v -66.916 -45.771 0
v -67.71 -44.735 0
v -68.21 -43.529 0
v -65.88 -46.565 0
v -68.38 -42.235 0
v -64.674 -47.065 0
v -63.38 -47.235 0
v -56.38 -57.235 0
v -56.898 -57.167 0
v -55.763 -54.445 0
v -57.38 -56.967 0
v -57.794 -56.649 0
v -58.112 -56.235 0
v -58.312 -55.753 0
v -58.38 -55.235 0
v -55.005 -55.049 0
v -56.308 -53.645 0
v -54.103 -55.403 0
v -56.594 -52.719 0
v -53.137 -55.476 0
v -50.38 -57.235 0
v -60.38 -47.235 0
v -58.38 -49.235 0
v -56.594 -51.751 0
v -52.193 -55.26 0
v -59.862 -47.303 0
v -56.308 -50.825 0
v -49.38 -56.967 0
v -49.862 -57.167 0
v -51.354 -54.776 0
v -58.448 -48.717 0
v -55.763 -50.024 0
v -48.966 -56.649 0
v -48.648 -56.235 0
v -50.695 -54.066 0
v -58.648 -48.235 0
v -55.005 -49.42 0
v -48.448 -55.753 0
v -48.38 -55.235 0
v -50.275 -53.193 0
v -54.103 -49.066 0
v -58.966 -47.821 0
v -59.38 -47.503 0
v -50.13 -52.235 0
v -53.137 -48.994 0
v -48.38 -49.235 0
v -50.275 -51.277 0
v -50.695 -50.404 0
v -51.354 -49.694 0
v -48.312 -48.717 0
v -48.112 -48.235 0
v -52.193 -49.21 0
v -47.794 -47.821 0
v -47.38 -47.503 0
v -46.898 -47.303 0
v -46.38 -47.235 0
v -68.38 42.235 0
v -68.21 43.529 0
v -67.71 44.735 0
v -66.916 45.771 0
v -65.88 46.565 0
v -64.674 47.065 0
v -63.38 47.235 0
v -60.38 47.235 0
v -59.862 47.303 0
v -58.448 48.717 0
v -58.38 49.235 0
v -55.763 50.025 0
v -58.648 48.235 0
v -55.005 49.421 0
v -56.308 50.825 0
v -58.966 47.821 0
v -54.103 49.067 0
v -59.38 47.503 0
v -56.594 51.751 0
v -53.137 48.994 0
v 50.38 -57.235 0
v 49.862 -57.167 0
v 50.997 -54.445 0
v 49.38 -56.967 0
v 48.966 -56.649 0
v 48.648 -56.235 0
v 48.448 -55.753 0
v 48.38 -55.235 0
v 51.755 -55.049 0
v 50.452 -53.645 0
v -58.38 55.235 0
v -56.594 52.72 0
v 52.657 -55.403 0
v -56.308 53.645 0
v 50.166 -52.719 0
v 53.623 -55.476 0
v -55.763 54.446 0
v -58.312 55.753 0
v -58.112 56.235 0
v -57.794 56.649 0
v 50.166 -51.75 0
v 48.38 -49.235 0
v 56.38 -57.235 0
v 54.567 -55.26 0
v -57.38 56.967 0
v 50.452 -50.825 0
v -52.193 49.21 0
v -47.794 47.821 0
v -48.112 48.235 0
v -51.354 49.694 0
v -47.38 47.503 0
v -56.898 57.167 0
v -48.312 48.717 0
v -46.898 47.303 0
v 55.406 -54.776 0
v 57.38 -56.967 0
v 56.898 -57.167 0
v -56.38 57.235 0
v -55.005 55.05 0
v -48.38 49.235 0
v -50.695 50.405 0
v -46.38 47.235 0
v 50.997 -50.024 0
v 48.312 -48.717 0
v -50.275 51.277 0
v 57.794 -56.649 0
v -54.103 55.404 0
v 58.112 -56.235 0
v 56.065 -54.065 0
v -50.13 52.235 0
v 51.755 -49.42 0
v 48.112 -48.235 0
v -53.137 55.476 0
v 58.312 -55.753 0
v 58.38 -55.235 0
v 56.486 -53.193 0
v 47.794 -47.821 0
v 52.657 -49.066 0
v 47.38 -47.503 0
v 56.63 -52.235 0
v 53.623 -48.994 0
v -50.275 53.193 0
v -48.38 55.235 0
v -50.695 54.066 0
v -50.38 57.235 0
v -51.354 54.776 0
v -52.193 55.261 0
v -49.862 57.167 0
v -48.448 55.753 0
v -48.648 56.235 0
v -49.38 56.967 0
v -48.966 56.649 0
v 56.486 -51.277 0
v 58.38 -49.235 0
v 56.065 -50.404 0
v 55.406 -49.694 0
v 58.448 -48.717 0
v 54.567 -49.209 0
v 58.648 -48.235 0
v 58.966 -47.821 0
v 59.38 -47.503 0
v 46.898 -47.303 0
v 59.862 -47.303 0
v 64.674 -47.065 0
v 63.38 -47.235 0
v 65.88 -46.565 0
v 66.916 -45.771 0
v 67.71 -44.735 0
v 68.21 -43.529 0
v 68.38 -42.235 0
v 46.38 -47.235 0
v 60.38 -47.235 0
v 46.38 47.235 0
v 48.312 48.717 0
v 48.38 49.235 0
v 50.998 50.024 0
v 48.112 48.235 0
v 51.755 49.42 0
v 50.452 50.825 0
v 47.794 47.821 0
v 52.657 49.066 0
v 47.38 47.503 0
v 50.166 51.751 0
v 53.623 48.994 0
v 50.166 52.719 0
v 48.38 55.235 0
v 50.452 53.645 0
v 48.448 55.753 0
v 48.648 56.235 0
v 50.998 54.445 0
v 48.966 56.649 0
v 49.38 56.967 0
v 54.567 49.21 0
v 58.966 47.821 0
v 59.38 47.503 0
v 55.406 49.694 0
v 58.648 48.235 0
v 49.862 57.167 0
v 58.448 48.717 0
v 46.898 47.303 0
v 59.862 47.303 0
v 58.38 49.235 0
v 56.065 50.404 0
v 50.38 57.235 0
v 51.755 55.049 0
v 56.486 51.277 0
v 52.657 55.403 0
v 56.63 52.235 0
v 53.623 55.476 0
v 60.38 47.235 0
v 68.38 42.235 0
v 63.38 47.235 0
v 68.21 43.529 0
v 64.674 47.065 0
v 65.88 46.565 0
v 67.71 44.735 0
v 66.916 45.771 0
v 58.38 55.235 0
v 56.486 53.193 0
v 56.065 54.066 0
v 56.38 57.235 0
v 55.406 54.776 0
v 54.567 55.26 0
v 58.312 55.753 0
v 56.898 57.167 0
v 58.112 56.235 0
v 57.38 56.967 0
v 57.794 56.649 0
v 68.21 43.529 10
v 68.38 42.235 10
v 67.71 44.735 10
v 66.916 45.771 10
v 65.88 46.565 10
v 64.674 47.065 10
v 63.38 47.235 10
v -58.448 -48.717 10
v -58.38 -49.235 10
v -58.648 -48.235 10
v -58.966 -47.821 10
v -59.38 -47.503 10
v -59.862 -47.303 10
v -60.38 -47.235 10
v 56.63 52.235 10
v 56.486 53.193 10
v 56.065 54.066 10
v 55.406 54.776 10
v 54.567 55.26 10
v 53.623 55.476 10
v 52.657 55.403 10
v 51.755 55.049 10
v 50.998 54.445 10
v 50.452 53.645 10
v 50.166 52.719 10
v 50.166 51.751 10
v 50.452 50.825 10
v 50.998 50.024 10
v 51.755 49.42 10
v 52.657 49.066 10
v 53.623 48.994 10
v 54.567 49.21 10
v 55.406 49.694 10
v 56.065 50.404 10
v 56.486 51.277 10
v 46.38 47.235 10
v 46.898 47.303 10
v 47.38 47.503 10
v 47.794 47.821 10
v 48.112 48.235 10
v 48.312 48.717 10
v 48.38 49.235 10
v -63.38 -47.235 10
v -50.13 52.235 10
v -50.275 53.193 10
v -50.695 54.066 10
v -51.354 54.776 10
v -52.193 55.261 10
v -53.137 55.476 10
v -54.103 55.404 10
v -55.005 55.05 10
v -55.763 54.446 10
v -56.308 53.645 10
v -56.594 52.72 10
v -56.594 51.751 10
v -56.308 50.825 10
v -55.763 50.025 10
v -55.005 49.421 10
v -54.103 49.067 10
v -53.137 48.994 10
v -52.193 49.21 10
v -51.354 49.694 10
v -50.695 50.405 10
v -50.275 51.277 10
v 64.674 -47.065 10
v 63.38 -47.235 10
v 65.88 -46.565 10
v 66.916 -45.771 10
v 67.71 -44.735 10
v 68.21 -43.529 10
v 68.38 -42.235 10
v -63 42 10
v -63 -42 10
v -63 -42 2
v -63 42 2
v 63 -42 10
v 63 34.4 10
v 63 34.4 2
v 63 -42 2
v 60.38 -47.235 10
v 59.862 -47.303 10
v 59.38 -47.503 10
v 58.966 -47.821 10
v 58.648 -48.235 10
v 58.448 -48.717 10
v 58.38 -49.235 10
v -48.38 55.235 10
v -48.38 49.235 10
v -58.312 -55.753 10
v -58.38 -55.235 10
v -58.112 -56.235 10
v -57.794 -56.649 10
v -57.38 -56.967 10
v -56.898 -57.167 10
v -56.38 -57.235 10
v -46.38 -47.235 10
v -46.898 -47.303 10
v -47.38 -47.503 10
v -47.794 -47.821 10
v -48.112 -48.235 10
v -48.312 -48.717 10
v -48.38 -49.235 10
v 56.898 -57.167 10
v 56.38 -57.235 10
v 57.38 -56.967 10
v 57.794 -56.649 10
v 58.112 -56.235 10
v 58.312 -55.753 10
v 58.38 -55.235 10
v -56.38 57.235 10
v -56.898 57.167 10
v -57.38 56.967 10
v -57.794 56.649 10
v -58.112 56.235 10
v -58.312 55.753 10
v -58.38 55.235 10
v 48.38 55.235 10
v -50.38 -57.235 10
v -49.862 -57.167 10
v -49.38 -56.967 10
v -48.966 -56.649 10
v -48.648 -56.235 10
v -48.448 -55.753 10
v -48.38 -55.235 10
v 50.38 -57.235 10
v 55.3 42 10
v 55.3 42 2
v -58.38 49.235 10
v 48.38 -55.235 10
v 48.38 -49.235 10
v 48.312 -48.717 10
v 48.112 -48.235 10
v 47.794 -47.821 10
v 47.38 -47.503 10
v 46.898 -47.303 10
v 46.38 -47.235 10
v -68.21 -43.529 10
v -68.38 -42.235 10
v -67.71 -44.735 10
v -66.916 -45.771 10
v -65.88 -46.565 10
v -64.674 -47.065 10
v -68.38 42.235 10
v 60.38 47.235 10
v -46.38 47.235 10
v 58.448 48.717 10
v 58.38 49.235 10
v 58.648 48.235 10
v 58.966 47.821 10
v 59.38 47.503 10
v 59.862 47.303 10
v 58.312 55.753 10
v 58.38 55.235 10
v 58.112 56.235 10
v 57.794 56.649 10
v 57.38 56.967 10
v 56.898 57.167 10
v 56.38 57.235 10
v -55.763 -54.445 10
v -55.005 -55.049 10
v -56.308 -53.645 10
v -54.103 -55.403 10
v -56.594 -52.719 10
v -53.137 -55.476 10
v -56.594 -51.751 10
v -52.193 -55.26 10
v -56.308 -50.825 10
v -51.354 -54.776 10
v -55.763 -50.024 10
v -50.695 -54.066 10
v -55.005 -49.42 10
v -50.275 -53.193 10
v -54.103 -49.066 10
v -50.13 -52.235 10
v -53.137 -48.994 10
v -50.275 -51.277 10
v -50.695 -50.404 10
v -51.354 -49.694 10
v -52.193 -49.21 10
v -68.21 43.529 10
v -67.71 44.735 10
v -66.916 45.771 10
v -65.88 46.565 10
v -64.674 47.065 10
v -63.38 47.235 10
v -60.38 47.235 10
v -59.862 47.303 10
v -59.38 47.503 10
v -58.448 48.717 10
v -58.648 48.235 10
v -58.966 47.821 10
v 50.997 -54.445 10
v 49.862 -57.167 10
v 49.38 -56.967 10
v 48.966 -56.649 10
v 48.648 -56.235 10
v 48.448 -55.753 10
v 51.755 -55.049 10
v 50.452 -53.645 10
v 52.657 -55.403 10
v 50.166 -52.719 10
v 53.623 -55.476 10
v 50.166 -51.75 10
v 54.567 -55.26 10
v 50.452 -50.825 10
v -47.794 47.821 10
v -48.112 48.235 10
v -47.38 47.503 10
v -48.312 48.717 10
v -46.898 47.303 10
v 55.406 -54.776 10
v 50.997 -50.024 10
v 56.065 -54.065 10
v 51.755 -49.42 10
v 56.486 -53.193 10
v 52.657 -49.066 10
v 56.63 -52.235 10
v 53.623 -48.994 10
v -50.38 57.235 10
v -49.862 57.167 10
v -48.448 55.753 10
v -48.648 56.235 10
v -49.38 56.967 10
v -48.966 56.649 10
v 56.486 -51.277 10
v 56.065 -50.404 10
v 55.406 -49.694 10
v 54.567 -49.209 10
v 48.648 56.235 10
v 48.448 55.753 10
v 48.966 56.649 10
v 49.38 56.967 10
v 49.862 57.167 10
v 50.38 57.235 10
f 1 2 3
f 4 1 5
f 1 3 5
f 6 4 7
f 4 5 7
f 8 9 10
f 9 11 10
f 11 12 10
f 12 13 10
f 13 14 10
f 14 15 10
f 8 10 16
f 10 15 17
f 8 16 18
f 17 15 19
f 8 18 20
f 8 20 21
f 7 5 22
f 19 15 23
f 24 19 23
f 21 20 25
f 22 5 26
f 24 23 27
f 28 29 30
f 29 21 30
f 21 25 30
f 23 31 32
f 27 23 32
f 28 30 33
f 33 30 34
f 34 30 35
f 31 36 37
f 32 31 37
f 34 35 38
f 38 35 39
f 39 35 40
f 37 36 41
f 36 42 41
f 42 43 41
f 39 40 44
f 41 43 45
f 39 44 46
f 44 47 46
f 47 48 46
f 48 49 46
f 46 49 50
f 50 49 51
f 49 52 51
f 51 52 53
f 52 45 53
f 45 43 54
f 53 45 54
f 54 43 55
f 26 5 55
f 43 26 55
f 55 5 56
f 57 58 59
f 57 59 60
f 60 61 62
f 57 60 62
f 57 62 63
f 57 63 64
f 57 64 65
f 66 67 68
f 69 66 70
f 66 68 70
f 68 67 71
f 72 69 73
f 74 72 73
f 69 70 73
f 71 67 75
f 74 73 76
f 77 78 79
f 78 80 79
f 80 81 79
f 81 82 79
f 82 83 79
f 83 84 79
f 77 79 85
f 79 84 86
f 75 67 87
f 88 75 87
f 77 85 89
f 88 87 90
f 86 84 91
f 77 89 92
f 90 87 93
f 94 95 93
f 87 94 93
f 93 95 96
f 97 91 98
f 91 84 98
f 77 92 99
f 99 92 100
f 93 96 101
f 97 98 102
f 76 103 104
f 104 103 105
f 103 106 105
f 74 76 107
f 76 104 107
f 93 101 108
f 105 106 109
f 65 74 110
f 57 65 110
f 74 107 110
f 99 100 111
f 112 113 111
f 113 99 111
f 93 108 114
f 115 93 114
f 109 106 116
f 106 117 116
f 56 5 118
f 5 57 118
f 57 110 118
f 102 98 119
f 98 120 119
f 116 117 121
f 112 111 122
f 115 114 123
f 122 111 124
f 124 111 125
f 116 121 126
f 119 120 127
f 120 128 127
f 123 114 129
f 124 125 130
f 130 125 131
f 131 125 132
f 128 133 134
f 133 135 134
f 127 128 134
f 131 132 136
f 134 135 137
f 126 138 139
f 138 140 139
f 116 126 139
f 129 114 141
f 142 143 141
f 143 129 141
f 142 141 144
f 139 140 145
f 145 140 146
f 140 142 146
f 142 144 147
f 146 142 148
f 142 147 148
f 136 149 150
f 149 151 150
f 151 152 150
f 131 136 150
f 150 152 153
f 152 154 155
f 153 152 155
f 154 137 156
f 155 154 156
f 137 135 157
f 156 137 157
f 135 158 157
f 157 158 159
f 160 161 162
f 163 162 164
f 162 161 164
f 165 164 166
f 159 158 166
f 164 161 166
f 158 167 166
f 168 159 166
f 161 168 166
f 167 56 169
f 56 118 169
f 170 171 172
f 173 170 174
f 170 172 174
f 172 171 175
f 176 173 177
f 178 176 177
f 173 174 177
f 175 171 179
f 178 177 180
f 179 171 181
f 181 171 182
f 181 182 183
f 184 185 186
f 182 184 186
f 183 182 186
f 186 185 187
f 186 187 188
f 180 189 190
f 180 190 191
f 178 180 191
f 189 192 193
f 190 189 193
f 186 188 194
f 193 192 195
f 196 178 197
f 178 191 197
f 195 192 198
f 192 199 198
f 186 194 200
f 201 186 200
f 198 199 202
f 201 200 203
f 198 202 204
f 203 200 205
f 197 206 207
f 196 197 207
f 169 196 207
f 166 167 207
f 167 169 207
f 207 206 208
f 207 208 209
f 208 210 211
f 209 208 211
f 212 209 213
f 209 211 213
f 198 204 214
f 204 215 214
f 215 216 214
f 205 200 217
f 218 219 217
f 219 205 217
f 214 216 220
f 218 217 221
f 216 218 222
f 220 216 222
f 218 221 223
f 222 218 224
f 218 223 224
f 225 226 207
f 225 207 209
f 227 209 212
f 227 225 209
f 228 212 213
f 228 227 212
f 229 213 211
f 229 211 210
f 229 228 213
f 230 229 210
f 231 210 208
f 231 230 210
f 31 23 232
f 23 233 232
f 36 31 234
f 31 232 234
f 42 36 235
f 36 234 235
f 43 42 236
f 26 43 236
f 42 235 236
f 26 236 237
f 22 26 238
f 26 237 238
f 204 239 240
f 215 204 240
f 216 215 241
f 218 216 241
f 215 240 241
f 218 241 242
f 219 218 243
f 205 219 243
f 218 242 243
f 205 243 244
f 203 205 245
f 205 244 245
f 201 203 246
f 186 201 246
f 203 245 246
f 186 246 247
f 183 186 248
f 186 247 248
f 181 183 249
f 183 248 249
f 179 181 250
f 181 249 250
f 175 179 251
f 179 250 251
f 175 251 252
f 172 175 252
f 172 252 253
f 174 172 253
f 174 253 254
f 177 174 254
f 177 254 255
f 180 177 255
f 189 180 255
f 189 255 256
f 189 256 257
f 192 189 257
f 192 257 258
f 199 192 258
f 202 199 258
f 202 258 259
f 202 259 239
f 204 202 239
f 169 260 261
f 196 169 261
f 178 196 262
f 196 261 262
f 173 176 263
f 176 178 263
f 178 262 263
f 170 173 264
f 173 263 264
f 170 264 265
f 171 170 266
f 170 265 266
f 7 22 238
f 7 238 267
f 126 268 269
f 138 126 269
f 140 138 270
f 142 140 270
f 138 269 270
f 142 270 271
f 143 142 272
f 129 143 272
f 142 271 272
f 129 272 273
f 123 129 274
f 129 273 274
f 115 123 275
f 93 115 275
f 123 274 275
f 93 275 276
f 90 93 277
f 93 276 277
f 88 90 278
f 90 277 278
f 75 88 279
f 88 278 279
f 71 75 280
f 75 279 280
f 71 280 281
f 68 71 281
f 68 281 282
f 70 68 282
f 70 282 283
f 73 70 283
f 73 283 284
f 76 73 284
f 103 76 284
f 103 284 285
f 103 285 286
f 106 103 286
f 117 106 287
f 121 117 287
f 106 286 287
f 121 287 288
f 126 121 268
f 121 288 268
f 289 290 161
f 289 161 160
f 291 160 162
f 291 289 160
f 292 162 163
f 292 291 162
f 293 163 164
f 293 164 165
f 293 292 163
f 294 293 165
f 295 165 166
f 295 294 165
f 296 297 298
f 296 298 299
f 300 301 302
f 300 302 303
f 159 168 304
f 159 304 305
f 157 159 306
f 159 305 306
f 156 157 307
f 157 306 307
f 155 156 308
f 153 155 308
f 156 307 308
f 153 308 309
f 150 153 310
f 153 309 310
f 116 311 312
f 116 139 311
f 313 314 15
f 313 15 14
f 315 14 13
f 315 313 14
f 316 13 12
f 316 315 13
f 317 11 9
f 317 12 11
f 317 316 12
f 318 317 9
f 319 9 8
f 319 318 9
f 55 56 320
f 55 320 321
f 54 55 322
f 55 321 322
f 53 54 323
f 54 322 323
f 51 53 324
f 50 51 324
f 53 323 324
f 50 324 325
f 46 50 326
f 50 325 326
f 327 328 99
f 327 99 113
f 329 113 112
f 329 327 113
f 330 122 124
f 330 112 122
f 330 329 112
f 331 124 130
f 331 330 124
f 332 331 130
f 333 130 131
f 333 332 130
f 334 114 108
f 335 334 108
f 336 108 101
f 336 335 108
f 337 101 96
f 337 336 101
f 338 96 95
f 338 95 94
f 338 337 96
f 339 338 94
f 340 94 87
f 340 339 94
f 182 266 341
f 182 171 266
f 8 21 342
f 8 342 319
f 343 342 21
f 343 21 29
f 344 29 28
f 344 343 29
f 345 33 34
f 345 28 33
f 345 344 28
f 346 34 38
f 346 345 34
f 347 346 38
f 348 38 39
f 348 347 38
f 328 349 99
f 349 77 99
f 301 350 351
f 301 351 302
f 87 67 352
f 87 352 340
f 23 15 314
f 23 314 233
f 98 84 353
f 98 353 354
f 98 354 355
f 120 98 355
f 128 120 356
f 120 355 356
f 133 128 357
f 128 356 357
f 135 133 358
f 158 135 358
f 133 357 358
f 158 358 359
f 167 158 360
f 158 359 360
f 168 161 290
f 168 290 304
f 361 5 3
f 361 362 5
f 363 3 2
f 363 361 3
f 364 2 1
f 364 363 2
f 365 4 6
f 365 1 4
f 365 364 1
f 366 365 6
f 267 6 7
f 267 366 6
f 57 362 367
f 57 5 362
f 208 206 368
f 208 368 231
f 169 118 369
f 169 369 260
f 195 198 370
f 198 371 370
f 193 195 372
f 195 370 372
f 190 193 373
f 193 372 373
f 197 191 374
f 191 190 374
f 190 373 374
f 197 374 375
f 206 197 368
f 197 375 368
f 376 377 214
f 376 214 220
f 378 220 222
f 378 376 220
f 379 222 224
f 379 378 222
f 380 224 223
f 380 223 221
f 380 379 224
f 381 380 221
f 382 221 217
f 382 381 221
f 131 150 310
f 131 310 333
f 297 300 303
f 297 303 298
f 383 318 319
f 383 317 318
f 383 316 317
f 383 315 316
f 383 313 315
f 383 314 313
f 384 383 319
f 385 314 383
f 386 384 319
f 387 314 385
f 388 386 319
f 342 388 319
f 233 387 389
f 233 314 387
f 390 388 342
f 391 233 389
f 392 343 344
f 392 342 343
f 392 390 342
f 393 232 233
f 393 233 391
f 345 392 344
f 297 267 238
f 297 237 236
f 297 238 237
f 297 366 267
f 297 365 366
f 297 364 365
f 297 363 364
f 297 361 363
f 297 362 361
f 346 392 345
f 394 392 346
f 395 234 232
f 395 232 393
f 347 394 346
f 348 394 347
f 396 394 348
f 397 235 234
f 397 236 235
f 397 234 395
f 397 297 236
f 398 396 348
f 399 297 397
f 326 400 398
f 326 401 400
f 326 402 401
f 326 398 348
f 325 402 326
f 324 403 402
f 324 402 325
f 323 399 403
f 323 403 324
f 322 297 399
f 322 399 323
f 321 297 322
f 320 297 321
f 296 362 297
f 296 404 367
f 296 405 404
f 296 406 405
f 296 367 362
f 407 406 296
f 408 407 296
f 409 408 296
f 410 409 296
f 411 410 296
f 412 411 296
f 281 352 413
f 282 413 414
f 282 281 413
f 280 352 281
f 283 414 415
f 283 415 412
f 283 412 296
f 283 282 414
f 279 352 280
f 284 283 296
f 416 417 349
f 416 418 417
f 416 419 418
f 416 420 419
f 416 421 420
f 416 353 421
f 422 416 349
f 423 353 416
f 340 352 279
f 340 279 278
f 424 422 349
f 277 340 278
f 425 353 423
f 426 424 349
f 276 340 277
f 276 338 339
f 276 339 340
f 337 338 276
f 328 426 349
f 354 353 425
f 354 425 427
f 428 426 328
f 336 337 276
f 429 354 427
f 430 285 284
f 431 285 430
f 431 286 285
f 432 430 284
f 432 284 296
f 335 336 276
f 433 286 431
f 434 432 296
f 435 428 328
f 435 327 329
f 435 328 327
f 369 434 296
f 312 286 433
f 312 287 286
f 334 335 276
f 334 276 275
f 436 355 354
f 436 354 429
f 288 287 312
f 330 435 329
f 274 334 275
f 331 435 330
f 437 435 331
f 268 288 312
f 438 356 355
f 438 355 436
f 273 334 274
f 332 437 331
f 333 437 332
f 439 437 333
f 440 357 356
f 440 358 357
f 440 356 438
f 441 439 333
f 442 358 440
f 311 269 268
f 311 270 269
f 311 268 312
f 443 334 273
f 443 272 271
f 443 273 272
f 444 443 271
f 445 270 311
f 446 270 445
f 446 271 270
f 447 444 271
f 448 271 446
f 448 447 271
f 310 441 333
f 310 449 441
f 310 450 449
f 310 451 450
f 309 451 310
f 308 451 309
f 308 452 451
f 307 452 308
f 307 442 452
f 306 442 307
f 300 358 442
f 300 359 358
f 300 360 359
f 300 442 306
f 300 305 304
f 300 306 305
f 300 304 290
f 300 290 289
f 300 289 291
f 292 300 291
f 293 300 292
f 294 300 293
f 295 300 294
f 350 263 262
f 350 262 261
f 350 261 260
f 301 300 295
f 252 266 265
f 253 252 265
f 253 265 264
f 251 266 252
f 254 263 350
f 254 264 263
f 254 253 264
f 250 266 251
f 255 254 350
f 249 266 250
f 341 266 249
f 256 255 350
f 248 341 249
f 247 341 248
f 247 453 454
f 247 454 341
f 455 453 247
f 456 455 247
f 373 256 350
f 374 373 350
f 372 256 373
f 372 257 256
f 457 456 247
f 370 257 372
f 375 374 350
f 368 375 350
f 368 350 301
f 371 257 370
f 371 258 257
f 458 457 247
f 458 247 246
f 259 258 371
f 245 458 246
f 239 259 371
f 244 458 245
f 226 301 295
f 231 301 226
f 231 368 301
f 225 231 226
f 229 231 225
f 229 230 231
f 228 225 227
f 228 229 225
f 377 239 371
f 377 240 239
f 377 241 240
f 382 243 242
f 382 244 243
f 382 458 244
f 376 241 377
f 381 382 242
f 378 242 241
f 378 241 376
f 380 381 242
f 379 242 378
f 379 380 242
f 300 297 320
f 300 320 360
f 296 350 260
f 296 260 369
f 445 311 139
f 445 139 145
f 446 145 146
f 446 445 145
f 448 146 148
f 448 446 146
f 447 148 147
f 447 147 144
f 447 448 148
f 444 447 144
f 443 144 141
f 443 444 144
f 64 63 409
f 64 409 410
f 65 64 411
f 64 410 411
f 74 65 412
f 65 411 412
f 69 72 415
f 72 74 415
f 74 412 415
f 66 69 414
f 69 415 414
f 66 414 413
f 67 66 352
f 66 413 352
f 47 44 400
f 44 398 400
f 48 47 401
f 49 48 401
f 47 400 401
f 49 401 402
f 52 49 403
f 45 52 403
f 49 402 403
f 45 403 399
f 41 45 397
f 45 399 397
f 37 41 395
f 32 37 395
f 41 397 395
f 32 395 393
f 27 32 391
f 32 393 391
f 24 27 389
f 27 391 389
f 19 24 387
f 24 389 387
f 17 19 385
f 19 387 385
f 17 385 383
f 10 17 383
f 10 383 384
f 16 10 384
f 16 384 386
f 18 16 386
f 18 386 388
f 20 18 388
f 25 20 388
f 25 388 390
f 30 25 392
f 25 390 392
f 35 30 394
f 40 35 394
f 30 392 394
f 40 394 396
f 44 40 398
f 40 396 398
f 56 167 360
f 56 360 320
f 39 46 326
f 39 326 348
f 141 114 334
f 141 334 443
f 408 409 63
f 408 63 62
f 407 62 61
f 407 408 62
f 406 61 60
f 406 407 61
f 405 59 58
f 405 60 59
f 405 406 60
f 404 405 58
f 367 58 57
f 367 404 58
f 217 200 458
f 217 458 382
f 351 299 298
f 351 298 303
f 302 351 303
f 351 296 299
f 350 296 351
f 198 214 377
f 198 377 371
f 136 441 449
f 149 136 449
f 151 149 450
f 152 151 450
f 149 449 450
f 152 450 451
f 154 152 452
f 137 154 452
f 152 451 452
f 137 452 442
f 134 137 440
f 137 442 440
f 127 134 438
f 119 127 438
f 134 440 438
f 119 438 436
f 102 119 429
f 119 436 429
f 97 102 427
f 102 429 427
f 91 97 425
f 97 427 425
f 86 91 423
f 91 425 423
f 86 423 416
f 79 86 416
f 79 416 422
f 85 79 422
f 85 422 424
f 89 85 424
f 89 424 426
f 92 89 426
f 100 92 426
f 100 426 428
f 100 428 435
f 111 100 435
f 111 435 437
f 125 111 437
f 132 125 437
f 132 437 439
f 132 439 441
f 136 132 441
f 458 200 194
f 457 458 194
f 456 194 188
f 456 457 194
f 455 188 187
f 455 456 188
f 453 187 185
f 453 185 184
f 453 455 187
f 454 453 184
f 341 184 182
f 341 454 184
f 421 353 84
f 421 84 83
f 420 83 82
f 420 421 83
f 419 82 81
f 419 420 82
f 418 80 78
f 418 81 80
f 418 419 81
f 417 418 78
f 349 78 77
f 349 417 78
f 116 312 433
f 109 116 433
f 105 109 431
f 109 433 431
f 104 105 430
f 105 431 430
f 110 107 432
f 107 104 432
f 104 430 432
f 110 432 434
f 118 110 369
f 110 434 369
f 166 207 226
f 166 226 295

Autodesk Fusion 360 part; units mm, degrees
sketch "Sketch1" plane through (0, 0, 0) normal (0, 0, 1) x (1, 0, 0)
  line L0 (68.38, -47.235) -> (-68.38, -47.235)
  line L1 (-68.38, -47.235) -> (-68.38, 47.235)
  line L2 (-68.38, 47.235) -> (68.38, 47.235)
  line L3 (68.38, 47.235) -> (68.38, -47.235)
  line L4 (68.38, -47.235) -> (-68.38, 47.235) construction
  line L5 (-68.38, -47.235) -> (68.38, 47.235) construction
  line L6 (-48.38, 47.235) -> (-58.38, 47.235)
  line L7 (-58.38, 47.235) -> (-58.38, 57.235)
  line L8 (-58.38, 57.235) -> (-48.38, 57.235)
  line L9 (-48.38, 57.235) -> (-48.38, 47.235)
  line L10 (-48.38, 47.235) -> (-58.38, 57.235) construction
  line L11 (-58.38, 47.235) -> (-48.38, 57.235) construction
  line L12 (48.38, 57.235) -> (58.38, 57.235)
  line L13 (48.38, 47.235) -> (48.38, 57.235)
  line L14 (58.38, 57.235) -> (58.38, 47.235)
  line L15 (58.38, 47.235) -> (48.38, 47.235)
  line L16 (48.38, -57.235) -> (48.38, -47.235)
  line L17 (48.38, -47.235) -> (58.38, -47.235)
  line L18 (58.38, -47.235) -> (58.38, -57.235)
  line L19 (48.38, -57.235) -> (58.38, -57.235)
  line L20 (-58.38, -57.235) -> (-58.38, -47.235)
  line L21 (-58.38, -47.235) -> (-48.38, -47.235)
  line L22 (-48.38, -47.235) -> (-48.38, -57.235)
  line L23 (-48.38, -57.235) -> (-58.38, -57.235)
  point P0 (-53.38, 52.235)
  dimension "d1" = 136.76
  dimension "d2" = 94.47
  dimension "d3" = 10
  dimension "d4" = 10
  dimension "d6" = 10
  dimension "d7" = 10
extrude "Extrude1" add sketch "Sketch1" along normal blind 10 and the other way blind 0
ref_plane "WorkPlane1" through (0, 0, 10) normal (0, 0, 1) x (1, 0, 0)
sketch "Sketch2" plane through (0, 0, 10) normal (0, 0, 1) x (1, 0, 0)
  line L0 (62.5, -41.5) -> (-62.5, -41.5)
  line L1 (-62.5, -41.5) -> (-62.5, 41.5)
  line L2 (-62.5, 41.5) -> (62.5, 41.5)
  line L3 (62.5, 41.5) -> (62.5, -41.5)
  line L4 (62.5, -41.5) -> (-62.5, 41.5) construction
  line L5 (-62.5, -41.5) -> (62.5, 41.5) construction
  line L6 (-62.5, -41.5) -> (-62.5, 34.9)
  line L7 (62.5, 41.5) -> (-55.8, 41.5)
  line L8 (-62.5, 34.9) -> (-55.8, 41.5)
  dimension "d13" = 125
  dimension "d14" = 83
  dimension "d15" = 76.4
  dimension "d16" = 118.3
extrude "Extrude2" cut sketch "Sketch2" against normal blind 8 contours L0 L1 L2 L3 L6 L7 L8
ref_plane "WorkPlane2" through (0, 0, 10) normal (0, 0, 1) x (1, 0, 0)
sketch "Sketch3" plane through (0, 0, 10) normal (0, 0, 1) x (1, 0, 0)
  circle A0 centre (-53.3802, 52.2353) radius 3.25
  circle A1 centre (53.38, 52.2349) radius 3.25
  circle A2 centre (53.3799, -52.2347) radius 3.25
  circle A3 centre (-53.3802, -52.2349) radius 3.25
  dimension "d20" = 6.5
  dimension "d21" = 6.5
  dimension "d22" = 6.5
  dimension "d23" = 6.5
extrude "Extrude3" cut sketch "Sketch3" against normal blind 10
fillet "Fillet1" radius 5 4 edges at (68.38, -47.235, 5) (68.38, 47.235, 5) (-68.38, -47.235, 5) (-68.38, 47.235, 5)
fillet "Fillet2" radius 2 16 edges at (58.38, -47.235, 5) (58.38, -57.235, 5) (48.38, -57.235, 5) (58.38, 57.235, 5) (-48.38, -47.235, 5) (-48.38, -57.235, 5) (-58.38, -57.235, 5) (-48.38, 57.235, 5) (58.38, 47.235, 5) (-48.38, 47.235, 5) (-58.38, 57.235, 5) (48.38, 57.235, 5) (48.38, 47.235, 5) (-58.38, 47.235, 5) (48.38, -47.235, 5) (-58.38, -47.235, 5)
extrude "Extrude4" add 1 faces at (-18.6, -13.8333, 2) along direction (0, 0, 1) blind 8
ref_plane "WorkPlane3" through (0, 0, 10) normal (0, 0, 1) x (1, 0, 0)
sketch "Sketch4" plane through (0, 0, 10) normal (0, 0, 1) x (1, 0, 0)
  line L0 (63, -42) -> (-63, -42)
  line L1 (-63, -42) -> (-63, 42)
  line L2 (-63, 42) -> (63, 42)
  line L3 (63, 42) -> (63, -42)
  line L4 (63, -42) -> (-63, 42) construction
  line L5 (-63, -42) -> (63, 42) construction
  line L6 (63, -42) -> (63, 34.4)
  line L7 (-63, 42) -> (55.3, 42)
  line L8 (55.3, 42) -> (63, 34.4)
  dimension "d31" = 126
  dimension "d32" = 84
  dimension "d33" = 76.4
  dimension "d34" = 118.3
extrude "Extrude6" cut sketch "Sketch4" against normal blind 8 contours L0 L1 L2 L3 L6 L7 L8
extrude "Extrude5" cut sketch "Sketch4" against normal blind 8 contours L0 L1 L2 L3 L6 L7 L8
